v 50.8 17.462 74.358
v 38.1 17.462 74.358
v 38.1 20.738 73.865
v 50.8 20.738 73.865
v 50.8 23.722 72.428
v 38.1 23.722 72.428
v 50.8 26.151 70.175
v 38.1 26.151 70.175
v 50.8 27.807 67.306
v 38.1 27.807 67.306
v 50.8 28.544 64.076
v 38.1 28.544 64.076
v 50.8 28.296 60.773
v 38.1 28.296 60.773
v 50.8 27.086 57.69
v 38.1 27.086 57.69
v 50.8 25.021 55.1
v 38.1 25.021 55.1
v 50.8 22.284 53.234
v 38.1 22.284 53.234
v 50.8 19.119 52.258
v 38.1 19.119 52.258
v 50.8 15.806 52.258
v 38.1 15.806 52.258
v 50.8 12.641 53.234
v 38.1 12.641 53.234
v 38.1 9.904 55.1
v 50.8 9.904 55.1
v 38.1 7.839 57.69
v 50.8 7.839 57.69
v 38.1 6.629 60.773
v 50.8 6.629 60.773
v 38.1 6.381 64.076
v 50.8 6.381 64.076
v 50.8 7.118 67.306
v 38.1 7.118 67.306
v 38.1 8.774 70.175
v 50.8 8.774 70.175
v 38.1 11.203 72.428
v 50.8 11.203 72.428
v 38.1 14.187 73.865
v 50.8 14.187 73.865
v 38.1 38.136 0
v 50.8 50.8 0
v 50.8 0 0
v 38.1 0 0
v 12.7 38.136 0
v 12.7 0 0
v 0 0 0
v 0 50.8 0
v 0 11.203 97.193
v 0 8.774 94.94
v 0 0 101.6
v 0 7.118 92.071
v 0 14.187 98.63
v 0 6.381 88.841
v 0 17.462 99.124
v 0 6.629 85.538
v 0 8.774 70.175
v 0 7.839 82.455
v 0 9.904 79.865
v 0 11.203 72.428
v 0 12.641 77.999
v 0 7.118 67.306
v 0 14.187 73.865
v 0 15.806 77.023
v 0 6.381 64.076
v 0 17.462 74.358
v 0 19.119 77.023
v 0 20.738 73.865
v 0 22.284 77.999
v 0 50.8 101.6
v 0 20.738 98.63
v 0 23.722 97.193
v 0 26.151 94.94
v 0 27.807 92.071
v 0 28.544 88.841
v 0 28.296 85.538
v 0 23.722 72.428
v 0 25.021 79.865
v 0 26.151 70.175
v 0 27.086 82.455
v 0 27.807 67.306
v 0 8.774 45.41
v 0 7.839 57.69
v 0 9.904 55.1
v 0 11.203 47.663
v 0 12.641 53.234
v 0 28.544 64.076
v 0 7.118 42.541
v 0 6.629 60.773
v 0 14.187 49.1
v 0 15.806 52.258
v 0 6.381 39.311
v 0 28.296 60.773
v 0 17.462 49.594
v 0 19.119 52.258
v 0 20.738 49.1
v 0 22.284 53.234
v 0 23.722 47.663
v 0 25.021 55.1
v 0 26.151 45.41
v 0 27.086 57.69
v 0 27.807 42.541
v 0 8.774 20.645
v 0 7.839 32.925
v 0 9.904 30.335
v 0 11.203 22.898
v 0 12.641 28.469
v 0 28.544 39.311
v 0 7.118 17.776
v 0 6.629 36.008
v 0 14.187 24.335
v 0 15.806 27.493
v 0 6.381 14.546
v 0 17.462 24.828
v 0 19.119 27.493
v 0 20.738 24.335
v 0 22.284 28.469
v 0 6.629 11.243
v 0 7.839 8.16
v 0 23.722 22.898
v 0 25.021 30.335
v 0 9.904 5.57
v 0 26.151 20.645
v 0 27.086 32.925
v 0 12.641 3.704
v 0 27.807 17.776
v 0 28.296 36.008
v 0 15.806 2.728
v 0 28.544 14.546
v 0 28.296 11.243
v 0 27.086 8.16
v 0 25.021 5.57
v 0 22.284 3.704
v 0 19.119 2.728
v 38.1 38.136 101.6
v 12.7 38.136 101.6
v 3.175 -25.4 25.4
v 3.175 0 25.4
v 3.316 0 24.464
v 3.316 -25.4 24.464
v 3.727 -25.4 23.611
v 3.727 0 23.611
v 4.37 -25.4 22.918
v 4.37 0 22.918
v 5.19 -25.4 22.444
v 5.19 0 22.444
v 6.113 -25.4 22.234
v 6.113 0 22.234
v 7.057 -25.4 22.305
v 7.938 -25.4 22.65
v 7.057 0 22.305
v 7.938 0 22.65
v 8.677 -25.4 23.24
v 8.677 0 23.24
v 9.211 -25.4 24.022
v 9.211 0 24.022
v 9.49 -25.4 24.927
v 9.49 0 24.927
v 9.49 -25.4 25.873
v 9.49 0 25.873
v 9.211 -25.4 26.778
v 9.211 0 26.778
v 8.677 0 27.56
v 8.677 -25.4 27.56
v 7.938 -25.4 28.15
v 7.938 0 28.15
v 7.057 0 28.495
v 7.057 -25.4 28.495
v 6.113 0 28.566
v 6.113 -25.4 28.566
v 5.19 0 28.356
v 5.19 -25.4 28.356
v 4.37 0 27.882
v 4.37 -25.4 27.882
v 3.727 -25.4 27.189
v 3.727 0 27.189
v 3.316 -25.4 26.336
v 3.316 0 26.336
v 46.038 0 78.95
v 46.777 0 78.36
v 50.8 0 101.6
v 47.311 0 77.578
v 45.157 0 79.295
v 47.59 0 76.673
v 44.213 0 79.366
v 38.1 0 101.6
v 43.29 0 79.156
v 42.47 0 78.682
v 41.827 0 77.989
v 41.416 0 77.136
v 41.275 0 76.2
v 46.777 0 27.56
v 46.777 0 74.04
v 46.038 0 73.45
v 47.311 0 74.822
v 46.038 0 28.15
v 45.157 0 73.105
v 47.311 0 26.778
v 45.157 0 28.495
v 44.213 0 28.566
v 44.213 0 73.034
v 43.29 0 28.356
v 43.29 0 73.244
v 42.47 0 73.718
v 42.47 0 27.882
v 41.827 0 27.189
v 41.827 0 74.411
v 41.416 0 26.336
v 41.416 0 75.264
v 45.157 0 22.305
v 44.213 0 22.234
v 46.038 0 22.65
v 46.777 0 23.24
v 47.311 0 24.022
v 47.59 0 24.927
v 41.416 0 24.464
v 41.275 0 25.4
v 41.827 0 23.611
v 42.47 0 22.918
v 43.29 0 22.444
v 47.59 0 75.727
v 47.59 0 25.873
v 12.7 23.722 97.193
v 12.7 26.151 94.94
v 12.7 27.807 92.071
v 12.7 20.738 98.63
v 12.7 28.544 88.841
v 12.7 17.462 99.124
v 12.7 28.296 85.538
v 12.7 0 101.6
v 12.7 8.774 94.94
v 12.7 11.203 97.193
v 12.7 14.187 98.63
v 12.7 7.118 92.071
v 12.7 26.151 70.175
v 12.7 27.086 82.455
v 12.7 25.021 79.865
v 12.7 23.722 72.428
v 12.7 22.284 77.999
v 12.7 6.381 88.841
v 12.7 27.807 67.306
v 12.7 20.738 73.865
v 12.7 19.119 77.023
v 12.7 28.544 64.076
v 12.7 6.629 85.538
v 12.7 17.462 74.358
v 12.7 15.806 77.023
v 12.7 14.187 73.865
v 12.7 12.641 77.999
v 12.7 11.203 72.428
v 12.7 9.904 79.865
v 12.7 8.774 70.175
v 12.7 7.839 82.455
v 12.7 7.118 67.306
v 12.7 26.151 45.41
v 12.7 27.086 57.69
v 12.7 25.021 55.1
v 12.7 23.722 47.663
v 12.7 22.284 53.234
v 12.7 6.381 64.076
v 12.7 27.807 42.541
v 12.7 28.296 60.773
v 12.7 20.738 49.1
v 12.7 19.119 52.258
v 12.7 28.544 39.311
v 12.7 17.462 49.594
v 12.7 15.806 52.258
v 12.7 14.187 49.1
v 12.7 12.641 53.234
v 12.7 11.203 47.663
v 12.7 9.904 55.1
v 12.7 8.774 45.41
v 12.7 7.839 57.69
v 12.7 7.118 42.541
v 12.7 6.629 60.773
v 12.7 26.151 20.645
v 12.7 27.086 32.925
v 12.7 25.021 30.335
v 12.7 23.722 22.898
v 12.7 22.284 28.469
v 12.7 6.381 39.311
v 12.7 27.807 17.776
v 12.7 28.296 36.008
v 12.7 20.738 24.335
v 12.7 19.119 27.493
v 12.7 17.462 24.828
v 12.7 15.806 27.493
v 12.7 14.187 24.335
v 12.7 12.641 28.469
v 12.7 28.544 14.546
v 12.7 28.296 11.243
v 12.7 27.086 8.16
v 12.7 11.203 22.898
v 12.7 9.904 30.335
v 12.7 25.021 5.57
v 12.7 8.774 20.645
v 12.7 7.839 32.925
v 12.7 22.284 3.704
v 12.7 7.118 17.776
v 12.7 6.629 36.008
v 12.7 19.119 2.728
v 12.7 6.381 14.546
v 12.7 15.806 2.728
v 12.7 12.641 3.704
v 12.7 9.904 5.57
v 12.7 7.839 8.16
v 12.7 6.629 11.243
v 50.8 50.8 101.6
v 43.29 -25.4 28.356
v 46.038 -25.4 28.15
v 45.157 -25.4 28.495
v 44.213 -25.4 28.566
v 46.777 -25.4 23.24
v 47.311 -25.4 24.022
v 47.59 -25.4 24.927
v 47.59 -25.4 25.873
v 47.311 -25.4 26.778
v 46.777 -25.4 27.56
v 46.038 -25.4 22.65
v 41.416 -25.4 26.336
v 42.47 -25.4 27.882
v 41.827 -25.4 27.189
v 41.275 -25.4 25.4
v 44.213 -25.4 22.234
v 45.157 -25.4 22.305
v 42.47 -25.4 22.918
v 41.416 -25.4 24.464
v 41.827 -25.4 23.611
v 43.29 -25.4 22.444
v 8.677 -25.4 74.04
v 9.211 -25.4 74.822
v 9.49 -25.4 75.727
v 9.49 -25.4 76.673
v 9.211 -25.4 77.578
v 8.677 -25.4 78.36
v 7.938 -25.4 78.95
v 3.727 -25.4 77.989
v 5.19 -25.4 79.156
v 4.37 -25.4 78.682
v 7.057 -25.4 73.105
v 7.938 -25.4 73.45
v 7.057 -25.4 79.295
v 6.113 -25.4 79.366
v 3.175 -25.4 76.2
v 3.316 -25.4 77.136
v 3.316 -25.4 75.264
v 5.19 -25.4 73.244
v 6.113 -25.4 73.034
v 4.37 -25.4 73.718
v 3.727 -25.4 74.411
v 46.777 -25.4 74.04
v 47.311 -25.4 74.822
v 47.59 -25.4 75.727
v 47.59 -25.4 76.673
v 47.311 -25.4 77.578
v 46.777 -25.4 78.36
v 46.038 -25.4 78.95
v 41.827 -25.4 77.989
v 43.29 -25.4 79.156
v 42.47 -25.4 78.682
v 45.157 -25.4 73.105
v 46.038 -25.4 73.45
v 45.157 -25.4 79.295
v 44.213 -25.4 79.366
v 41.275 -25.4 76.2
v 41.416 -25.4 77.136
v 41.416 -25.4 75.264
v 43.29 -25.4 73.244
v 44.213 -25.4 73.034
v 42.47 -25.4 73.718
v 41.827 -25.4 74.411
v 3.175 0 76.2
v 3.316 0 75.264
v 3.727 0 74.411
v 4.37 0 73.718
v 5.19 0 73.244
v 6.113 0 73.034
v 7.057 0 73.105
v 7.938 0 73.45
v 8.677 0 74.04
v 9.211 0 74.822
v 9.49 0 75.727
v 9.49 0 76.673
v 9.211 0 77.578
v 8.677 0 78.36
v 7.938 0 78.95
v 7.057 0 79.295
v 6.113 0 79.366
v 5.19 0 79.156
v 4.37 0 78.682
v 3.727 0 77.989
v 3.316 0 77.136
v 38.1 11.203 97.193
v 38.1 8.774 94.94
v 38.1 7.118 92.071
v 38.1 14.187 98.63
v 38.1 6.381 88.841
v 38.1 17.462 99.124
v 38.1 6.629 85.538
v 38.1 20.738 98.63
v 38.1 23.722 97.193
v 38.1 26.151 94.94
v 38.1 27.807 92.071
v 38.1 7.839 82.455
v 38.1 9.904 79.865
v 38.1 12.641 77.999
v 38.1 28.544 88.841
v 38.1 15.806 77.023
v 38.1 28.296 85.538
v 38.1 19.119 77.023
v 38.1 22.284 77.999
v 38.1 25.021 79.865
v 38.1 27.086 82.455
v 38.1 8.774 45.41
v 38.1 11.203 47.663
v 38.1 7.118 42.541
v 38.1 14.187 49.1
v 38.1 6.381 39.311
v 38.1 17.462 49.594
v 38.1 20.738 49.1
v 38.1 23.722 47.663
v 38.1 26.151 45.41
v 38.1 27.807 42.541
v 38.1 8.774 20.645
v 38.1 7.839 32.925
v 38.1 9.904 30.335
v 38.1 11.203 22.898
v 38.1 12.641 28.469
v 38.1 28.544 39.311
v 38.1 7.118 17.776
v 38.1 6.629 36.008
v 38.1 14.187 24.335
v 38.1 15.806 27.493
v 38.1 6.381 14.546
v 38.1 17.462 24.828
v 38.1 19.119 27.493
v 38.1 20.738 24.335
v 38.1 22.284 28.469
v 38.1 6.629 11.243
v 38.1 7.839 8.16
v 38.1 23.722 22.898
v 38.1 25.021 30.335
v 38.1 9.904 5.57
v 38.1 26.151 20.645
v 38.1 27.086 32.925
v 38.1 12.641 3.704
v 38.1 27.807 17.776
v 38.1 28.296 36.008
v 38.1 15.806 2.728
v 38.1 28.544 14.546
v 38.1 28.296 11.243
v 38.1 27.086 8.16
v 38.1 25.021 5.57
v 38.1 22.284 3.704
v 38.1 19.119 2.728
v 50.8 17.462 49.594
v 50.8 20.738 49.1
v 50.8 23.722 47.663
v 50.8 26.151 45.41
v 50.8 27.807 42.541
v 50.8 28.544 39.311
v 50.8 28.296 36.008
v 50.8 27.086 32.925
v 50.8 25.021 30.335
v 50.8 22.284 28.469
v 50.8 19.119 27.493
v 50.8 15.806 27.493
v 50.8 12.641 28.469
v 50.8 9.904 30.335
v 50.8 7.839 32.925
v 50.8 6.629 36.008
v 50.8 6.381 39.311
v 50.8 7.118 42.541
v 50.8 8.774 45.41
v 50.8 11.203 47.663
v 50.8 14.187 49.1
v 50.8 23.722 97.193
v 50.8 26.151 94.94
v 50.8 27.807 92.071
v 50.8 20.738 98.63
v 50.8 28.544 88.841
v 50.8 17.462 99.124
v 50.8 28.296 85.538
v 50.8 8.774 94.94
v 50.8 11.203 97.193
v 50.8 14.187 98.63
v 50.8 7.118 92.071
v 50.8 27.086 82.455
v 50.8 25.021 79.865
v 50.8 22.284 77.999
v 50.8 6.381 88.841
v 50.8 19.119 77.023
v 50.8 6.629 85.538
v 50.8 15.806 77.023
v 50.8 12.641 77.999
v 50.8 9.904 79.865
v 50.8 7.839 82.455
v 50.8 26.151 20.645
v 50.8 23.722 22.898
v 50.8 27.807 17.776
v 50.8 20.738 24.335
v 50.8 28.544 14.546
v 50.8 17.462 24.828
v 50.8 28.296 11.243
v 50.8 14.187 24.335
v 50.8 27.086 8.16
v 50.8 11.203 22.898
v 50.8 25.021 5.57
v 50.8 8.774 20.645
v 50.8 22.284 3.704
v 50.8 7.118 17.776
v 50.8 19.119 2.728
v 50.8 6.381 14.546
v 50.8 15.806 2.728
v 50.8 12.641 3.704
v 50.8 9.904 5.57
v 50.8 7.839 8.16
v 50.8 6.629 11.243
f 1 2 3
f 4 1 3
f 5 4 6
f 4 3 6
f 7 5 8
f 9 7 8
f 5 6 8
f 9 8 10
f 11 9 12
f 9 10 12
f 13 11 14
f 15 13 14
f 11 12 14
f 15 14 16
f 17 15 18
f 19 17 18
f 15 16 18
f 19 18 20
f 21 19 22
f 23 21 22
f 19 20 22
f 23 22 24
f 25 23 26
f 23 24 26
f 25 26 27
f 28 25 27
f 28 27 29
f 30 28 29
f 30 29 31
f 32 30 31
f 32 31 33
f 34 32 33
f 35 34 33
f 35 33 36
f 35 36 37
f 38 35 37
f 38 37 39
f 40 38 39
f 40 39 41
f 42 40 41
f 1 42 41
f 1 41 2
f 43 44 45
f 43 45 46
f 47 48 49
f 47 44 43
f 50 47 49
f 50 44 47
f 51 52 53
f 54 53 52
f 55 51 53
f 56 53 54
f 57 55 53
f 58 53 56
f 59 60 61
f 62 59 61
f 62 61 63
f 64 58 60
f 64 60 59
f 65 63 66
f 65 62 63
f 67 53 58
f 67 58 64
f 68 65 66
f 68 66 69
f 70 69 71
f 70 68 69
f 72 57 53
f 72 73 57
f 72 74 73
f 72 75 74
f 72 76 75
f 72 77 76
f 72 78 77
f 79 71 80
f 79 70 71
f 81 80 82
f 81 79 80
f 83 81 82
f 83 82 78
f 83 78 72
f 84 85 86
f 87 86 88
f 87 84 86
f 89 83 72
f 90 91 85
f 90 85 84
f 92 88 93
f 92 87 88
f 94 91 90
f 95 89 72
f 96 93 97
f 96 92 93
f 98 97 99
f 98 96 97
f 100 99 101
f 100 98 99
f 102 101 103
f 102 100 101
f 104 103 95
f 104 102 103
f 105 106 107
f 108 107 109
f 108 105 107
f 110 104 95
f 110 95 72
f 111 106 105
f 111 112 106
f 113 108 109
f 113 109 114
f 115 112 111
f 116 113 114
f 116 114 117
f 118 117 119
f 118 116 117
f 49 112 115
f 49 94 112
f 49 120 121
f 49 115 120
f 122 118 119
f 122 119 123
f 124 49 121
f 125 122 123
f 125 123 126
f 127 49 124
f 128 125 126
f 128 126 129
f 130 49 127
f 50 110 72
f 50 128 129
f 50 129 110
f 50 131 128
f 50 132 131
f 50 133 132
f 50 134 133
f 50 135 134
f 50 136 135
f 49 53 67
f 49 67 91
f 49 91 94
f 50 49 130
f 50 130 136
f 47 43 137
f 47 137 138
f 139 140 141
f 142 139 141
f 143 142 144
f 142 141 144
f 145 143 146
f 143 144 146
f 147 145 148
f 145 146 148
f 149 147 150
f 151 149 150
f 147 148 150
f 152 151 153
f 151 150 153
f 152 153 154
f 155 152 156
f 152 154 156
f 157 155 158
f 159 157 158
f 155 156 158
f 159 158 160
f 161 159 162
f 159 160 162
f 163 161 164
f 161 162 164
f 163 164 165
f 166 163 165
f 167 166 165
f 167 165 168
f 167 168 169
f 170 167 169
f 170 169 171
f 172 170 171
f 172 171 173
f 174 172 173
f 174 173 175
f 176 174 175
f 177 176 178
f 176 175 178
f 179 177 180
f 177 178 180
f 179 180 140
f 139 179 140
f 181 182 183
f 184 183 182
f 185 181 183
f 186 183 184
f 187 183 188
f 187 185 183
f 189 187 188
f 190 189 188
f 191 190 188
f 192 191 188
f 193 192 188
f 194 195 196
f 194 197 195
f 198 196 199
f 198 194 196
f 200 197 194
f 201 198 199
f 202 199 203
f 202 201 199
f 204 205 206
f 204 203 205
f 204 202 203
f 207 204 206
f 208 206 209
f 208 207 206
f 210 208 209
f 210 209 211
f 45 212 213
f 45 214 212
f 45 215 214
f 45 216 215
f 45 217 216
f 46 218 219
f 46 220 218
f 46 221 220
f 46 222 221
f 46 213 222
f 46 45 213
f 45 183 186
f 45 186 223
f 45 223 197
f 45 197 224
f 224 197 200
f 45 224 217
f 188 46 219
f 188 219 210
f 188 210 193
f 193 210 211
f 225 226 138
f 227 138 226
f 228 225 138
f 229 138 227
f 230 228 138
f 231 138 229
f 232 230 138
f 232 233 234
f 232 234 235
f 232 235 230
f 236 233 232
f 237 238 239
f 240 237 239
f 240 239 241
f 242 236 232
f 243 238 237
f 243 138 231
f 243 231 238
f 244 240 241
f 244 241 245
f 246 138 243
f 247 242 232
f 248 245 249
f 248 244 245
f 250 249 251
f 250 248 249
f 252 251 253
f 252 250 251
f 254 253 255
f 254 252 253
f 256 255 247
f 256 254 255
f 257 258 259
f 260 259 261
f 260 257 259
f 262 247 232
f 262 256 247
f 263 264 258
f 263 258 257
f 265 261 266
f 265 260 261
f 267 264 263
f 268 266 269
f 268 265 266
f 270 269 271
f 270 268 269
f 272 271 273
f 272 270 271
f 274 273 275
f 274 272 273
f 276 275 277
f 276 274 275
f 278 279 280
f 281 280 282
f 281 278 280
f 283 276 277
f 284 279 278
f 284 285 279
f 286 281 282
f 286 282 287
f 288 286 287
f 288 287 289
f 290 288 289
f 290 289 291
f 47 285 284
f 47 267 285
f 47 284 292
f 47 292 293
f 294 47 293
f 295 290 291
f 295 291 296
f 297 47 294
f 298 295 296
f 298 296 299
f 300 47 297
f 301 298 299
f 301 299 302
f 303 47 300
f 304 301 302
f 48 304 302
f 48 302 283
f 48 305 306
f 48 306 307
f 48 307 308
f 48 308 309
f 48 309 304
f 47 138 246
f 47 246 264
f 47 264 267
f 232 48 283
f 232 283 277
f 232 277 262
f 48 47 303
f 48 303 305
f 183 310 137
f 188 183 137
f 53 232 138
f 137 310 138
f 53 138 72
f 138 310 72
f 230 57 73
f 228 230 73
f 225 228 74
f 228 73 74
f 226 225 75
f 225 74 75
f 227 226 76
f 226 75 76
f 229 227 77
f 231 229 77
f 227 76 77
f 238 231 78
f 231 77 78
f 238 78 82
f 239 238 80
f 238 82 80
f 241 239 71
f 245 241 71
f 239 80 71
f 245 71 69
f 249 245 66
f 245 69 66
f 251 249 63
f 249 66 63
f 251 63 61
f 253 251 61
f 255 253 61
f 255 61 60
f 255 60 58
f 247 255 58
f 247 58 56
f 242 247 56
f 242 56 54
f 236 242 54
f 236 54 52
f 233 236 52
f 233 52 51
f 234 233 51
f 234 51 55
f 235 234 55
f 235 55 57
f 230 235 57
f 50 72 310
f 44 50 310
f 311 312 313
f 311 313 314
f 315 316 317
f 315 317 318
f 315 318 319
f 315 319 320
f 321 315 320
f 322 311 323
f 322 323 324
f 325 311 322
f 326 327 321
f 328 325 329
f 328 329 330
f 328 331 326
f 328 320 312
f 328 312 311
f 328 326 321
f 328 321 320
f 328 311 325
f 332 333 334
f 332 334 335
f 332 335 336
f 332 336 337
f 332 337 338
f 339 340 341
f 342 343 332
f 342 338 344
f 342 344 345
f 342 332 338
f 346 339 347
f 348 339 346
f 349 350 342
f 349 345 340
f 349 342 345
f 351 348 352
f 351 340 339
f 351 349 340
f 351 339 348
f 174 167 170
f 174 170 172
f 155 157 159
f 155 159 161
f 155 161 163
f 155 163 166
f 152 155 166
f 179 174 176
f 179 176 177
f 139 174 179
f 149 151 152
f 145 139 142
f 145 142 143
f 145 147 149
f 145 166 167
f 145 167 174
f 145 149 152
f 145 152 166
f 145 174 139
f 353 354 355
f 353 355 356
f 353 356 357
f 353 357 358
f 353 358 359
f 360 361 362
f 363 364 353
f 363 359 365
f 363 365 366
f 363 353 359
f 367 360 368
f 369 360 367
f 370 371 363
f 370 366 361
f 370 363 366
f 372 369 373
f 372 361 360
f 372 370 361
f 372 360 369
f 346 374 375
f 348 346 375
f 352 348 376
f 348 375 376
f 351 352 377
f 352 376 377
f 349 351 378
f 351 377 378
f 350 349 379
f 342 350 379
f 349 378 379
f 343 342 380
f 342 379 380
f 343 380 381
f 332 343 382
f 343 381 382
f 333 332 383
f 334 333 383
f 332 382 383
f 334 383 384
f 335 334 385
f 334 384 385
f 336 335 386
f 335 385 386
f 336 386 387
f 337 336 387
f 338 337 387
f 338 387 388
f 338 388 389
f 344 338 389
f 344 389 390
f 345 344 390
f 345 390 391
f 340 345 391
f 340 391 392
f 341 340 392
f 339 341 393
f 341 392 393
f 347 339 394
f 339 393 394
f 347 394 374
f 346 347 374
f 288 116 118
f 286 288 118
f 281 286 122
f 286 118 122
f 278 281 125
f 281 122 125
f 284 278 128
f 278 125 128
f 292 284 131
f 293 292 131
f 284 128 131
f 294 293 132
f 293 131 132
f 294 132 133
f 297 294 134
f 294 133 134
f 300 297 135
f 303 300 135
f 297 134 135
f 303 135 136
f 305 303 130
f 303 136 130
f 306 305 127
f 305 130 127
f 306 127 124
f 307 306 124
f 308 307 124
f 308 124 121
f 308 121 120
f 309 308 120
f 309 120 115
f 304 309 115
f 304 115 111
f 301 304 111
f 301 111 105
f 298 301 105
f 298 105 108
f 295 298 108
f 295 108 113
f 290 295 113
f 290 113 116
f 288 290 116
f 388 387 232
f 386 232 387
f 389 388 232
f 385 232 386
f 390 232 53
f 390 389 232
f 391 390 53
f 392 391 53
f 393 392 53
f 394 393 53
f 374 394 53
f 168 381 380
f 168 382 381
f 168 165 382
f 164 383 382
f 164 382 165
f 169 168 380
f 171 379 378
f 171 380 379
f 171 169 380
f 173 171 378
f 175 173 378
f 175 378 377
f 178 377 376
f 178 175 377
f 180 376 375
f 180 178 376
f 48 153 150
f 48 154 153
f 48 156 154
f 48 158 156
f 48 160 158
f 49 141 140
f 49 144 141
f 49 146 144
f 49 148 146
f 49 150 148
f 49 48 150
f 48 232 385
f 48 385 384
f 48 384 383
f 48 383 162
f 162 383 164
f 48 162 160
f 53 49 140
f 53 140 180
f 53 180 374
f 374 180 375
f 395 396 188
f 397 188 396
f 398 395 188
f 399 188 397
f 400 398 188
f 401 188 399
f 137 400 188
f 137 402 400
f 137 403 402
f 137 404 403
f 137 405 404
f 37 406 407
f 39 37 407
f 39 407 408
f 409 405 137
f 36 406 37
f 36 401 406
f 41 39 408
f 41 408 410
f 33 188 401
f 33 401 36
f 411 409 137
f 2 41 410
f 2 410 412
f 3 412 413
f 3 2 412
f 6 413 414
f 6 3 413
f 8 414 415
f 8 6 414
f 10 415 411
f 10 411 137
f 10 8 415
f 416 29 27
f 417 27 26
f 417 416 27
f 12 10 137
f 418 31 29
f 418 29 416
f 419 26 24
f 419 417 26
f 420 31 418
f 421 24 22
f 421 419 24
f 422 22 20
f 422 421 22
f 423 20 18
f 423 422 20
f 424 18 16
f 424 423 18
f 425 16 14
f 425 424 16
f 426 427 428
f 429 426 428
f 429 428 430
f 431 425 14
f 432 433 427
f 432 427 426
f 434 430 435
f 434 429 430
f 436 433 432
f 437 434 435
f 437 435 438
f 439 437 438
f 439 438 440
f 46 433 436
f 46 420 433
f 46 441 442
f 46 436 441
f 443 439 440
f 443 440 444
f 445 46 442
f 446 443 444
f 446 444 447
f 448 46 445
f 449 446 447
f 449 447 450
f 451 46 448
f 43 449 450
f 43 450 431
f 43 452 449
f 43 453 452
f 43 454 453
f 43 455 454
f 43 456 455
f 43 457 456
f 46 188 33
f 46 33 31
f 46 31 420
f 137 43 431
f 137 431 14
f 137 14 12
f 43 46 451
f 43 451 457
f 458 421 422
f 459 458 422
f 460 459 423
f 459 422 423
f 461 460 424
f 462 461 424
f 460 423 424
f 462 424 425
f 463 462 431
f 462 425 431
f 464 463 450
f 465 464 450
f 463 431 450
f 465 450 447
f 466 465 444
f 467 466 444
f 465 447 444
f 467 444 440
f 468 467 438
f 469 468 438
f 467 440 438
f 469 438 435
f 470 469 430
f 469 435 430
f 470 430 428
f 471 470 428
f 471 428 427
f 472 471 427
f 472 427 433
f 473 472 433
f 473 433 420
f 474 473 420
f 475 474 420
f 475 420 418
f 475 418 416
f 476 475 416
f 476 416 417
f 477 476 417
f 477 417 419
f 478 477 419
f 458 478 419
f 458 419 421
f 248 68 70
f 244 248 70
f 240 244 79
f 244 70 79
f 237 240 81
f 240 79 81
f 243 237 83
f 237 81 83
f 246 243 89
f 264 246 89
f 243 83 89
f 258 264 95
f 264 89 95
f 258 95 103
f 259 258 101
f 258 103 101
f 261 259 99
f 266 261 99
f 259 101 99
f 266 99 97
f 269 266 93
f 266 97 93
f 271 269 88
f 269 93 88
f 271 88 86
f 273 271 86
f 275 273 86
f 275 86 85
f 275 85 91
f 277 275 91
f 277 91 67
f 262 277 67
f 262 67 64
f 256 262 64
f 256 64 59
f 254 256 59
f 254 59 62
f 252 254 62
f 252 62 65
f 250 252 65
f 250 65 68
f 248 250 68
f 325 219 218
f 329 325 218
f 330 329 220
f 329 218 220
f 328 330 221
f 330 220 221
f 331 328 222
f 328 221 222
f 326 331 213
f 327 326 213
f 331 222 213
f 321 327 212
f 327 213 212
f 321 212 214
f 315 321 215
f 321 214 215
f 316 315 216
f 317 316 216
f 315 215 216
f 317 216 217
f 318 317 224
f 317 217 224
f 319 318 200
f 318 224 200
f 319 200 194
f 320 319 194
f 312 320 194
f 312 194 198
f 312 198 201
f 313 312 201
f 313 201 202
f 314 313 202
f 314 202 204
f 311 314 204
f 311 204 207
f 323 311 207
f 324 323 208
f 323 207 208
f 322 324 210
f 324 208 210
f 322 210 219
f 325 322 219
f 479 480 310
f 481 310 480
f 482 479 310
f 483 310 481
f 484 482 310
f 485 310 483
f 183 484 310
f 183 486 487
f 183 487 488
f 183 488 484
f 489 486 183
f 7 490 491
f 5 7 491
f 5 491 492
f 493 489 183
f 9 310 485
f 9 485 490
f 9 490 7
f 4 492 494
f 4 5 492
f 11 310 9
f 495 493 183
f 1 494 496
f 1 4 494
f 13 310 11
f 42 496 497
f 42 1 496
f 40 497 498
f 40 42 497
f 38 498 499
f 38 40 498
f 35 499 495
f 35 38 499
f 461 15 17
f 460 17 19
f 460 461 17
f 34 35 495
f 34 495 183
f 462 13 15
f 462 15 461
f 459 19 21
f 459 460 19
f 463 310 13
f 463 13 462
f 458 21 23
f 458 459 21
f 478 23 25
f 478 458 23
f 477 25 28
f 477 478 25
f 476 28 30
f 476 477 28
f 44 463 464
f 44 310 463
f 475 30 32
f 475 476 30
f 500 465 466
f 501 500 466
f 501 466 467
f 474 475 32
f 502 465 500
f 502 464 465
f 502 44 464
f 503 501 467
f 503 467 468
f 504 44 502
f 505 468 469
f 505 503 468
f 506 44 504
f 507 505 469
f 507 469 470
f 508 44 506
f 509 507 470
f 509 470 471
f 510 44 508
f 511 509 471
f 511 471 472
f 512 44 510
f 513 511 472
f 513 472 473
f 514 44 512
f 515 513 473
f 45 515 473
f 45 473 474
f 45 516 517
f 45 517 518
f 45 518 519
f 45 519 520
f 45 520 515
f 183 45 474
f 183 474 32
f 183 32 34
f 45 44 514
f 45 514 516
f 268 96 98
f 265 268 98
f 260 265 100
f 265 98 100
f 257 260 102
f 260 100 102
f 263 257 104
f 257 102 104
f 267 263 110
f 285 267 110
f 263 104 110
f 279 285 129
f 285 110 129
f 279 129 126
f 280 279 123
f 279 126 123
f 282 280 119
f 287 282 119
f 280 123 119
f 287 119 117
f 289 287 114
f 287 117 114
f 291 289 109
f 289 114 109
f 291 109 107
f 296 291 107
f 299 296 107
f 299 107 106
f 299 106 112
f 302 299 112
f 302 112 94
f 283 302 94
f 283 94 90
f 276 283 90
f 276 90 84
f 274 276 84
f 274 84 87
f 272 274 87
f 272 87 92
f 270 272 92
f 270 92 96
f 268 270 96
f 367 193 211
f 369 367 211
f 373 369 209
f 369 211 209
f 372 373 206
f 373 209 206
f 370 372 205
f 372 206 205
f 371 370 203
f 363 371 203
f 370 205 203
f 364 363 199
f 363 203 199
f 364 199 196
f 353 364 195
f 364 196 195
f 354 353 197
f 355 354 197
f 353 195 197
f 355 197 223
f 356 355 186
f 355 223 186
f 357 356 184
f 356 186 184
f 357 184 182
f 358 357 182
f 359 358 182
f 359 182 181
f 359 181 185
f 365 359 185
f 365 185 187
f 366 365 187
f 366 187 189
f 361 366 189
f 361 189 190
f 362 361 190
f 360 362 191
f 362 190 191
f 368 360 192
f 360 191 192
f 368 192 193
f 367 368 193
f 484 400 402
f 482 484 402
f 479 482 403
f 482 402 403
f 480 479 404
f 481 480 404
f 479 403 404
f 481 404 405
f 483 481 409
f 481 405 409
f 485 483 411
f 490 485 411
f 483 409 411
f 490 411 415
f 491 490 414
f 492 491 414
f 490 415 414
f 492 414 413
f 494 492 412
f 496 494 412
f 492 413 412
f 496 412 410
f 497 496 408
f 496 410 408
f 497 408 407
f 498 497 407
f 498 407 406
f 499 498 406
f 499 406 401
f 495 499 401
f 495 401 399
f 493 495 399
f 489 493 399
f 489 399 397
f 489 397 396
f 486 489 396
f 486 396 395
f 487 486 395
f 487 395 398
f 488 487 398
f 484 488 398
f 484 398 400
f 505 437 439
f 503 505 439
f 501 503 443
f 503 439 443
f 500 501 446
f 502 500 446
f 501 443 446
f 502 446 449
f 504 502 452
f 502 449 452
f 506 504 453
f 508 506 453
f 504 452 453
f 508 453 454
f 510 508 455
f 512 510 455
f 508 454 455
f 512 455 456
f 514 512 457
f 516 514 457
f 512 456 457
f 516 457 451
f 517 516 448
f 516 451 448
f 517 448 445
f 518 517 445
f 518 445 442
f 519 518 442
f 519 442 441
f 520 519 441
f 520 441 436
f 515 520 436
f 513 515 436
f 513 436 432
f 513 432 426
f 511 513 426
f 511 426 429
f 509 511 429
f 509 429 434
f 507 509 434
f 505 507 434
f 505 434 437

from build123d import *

# Parameters (mm, degrees)
BOSS_EXTRUDE1_DEPTH = 101.6
SKETCH5_R           = 11.1125
CUT_EXTRUDE1_DEPTH  = 125.434078933
SKETCH6_R           = 3.175
BOSS_EXTRUDE3_DEPTH = 25.4


with BuildPart() as part:
    # Sketch4 → Boss-Extrude1 (new body)
    with BuildSketch(Plane.XY):
        Polygon((0, 0), (0, 50.8), (50.8, 50.8), (50.8, 0), (38.1, 0), (38.1, 38.135977337), (12.7, 38.135977337), (12.7, 0), align=None)
    extrude(amount=BOSS_EXTRUDE1_DEPTH)

    # Sketch5 → Cut-Extrude1 (cut, through all)
    with BuildSketch(Plane.ZY):
        with Locations((13.716, 17.4625)):
            Circle(SKETCH5_R)
        with Locations((38.481, 17.4625)):
            Circle(SKETCH5_R)
        with Locations((63.246, 17.4625)):
            Circle(SKETCH5_R)
        with Locations((88.011, 17.4625)):
            Circle(SKETCH5_R)
    extrude(amount=-CUT_EXTRUDE1_DEPTH, mode=Mode.SUBTRACT)

    # Sketch6 → Boss-Extrude3 (add)
    with BuildSketch(Plane.XZ):
        with Locations(Location((6.35, 25.4, 0), (0, 0, 180))):
            Circle(SKETCH6_R)
        with Locations(Location((6.35, 76.2, 0), (0, 0, 180))):
            Circle(SKETCH6_R)
        with Locations(Location((44.45, 76.2, 0), (0, 0, 180))):
            Circle(SKETCH6_R)
        with Locations(Location((44.45, 25.4, 0), (0, 0, 180))):
            Circle(SKETCH6_R)
    extrude(amount=BOSS_EXTRUDE3_DEPTH)


solid = part.part
